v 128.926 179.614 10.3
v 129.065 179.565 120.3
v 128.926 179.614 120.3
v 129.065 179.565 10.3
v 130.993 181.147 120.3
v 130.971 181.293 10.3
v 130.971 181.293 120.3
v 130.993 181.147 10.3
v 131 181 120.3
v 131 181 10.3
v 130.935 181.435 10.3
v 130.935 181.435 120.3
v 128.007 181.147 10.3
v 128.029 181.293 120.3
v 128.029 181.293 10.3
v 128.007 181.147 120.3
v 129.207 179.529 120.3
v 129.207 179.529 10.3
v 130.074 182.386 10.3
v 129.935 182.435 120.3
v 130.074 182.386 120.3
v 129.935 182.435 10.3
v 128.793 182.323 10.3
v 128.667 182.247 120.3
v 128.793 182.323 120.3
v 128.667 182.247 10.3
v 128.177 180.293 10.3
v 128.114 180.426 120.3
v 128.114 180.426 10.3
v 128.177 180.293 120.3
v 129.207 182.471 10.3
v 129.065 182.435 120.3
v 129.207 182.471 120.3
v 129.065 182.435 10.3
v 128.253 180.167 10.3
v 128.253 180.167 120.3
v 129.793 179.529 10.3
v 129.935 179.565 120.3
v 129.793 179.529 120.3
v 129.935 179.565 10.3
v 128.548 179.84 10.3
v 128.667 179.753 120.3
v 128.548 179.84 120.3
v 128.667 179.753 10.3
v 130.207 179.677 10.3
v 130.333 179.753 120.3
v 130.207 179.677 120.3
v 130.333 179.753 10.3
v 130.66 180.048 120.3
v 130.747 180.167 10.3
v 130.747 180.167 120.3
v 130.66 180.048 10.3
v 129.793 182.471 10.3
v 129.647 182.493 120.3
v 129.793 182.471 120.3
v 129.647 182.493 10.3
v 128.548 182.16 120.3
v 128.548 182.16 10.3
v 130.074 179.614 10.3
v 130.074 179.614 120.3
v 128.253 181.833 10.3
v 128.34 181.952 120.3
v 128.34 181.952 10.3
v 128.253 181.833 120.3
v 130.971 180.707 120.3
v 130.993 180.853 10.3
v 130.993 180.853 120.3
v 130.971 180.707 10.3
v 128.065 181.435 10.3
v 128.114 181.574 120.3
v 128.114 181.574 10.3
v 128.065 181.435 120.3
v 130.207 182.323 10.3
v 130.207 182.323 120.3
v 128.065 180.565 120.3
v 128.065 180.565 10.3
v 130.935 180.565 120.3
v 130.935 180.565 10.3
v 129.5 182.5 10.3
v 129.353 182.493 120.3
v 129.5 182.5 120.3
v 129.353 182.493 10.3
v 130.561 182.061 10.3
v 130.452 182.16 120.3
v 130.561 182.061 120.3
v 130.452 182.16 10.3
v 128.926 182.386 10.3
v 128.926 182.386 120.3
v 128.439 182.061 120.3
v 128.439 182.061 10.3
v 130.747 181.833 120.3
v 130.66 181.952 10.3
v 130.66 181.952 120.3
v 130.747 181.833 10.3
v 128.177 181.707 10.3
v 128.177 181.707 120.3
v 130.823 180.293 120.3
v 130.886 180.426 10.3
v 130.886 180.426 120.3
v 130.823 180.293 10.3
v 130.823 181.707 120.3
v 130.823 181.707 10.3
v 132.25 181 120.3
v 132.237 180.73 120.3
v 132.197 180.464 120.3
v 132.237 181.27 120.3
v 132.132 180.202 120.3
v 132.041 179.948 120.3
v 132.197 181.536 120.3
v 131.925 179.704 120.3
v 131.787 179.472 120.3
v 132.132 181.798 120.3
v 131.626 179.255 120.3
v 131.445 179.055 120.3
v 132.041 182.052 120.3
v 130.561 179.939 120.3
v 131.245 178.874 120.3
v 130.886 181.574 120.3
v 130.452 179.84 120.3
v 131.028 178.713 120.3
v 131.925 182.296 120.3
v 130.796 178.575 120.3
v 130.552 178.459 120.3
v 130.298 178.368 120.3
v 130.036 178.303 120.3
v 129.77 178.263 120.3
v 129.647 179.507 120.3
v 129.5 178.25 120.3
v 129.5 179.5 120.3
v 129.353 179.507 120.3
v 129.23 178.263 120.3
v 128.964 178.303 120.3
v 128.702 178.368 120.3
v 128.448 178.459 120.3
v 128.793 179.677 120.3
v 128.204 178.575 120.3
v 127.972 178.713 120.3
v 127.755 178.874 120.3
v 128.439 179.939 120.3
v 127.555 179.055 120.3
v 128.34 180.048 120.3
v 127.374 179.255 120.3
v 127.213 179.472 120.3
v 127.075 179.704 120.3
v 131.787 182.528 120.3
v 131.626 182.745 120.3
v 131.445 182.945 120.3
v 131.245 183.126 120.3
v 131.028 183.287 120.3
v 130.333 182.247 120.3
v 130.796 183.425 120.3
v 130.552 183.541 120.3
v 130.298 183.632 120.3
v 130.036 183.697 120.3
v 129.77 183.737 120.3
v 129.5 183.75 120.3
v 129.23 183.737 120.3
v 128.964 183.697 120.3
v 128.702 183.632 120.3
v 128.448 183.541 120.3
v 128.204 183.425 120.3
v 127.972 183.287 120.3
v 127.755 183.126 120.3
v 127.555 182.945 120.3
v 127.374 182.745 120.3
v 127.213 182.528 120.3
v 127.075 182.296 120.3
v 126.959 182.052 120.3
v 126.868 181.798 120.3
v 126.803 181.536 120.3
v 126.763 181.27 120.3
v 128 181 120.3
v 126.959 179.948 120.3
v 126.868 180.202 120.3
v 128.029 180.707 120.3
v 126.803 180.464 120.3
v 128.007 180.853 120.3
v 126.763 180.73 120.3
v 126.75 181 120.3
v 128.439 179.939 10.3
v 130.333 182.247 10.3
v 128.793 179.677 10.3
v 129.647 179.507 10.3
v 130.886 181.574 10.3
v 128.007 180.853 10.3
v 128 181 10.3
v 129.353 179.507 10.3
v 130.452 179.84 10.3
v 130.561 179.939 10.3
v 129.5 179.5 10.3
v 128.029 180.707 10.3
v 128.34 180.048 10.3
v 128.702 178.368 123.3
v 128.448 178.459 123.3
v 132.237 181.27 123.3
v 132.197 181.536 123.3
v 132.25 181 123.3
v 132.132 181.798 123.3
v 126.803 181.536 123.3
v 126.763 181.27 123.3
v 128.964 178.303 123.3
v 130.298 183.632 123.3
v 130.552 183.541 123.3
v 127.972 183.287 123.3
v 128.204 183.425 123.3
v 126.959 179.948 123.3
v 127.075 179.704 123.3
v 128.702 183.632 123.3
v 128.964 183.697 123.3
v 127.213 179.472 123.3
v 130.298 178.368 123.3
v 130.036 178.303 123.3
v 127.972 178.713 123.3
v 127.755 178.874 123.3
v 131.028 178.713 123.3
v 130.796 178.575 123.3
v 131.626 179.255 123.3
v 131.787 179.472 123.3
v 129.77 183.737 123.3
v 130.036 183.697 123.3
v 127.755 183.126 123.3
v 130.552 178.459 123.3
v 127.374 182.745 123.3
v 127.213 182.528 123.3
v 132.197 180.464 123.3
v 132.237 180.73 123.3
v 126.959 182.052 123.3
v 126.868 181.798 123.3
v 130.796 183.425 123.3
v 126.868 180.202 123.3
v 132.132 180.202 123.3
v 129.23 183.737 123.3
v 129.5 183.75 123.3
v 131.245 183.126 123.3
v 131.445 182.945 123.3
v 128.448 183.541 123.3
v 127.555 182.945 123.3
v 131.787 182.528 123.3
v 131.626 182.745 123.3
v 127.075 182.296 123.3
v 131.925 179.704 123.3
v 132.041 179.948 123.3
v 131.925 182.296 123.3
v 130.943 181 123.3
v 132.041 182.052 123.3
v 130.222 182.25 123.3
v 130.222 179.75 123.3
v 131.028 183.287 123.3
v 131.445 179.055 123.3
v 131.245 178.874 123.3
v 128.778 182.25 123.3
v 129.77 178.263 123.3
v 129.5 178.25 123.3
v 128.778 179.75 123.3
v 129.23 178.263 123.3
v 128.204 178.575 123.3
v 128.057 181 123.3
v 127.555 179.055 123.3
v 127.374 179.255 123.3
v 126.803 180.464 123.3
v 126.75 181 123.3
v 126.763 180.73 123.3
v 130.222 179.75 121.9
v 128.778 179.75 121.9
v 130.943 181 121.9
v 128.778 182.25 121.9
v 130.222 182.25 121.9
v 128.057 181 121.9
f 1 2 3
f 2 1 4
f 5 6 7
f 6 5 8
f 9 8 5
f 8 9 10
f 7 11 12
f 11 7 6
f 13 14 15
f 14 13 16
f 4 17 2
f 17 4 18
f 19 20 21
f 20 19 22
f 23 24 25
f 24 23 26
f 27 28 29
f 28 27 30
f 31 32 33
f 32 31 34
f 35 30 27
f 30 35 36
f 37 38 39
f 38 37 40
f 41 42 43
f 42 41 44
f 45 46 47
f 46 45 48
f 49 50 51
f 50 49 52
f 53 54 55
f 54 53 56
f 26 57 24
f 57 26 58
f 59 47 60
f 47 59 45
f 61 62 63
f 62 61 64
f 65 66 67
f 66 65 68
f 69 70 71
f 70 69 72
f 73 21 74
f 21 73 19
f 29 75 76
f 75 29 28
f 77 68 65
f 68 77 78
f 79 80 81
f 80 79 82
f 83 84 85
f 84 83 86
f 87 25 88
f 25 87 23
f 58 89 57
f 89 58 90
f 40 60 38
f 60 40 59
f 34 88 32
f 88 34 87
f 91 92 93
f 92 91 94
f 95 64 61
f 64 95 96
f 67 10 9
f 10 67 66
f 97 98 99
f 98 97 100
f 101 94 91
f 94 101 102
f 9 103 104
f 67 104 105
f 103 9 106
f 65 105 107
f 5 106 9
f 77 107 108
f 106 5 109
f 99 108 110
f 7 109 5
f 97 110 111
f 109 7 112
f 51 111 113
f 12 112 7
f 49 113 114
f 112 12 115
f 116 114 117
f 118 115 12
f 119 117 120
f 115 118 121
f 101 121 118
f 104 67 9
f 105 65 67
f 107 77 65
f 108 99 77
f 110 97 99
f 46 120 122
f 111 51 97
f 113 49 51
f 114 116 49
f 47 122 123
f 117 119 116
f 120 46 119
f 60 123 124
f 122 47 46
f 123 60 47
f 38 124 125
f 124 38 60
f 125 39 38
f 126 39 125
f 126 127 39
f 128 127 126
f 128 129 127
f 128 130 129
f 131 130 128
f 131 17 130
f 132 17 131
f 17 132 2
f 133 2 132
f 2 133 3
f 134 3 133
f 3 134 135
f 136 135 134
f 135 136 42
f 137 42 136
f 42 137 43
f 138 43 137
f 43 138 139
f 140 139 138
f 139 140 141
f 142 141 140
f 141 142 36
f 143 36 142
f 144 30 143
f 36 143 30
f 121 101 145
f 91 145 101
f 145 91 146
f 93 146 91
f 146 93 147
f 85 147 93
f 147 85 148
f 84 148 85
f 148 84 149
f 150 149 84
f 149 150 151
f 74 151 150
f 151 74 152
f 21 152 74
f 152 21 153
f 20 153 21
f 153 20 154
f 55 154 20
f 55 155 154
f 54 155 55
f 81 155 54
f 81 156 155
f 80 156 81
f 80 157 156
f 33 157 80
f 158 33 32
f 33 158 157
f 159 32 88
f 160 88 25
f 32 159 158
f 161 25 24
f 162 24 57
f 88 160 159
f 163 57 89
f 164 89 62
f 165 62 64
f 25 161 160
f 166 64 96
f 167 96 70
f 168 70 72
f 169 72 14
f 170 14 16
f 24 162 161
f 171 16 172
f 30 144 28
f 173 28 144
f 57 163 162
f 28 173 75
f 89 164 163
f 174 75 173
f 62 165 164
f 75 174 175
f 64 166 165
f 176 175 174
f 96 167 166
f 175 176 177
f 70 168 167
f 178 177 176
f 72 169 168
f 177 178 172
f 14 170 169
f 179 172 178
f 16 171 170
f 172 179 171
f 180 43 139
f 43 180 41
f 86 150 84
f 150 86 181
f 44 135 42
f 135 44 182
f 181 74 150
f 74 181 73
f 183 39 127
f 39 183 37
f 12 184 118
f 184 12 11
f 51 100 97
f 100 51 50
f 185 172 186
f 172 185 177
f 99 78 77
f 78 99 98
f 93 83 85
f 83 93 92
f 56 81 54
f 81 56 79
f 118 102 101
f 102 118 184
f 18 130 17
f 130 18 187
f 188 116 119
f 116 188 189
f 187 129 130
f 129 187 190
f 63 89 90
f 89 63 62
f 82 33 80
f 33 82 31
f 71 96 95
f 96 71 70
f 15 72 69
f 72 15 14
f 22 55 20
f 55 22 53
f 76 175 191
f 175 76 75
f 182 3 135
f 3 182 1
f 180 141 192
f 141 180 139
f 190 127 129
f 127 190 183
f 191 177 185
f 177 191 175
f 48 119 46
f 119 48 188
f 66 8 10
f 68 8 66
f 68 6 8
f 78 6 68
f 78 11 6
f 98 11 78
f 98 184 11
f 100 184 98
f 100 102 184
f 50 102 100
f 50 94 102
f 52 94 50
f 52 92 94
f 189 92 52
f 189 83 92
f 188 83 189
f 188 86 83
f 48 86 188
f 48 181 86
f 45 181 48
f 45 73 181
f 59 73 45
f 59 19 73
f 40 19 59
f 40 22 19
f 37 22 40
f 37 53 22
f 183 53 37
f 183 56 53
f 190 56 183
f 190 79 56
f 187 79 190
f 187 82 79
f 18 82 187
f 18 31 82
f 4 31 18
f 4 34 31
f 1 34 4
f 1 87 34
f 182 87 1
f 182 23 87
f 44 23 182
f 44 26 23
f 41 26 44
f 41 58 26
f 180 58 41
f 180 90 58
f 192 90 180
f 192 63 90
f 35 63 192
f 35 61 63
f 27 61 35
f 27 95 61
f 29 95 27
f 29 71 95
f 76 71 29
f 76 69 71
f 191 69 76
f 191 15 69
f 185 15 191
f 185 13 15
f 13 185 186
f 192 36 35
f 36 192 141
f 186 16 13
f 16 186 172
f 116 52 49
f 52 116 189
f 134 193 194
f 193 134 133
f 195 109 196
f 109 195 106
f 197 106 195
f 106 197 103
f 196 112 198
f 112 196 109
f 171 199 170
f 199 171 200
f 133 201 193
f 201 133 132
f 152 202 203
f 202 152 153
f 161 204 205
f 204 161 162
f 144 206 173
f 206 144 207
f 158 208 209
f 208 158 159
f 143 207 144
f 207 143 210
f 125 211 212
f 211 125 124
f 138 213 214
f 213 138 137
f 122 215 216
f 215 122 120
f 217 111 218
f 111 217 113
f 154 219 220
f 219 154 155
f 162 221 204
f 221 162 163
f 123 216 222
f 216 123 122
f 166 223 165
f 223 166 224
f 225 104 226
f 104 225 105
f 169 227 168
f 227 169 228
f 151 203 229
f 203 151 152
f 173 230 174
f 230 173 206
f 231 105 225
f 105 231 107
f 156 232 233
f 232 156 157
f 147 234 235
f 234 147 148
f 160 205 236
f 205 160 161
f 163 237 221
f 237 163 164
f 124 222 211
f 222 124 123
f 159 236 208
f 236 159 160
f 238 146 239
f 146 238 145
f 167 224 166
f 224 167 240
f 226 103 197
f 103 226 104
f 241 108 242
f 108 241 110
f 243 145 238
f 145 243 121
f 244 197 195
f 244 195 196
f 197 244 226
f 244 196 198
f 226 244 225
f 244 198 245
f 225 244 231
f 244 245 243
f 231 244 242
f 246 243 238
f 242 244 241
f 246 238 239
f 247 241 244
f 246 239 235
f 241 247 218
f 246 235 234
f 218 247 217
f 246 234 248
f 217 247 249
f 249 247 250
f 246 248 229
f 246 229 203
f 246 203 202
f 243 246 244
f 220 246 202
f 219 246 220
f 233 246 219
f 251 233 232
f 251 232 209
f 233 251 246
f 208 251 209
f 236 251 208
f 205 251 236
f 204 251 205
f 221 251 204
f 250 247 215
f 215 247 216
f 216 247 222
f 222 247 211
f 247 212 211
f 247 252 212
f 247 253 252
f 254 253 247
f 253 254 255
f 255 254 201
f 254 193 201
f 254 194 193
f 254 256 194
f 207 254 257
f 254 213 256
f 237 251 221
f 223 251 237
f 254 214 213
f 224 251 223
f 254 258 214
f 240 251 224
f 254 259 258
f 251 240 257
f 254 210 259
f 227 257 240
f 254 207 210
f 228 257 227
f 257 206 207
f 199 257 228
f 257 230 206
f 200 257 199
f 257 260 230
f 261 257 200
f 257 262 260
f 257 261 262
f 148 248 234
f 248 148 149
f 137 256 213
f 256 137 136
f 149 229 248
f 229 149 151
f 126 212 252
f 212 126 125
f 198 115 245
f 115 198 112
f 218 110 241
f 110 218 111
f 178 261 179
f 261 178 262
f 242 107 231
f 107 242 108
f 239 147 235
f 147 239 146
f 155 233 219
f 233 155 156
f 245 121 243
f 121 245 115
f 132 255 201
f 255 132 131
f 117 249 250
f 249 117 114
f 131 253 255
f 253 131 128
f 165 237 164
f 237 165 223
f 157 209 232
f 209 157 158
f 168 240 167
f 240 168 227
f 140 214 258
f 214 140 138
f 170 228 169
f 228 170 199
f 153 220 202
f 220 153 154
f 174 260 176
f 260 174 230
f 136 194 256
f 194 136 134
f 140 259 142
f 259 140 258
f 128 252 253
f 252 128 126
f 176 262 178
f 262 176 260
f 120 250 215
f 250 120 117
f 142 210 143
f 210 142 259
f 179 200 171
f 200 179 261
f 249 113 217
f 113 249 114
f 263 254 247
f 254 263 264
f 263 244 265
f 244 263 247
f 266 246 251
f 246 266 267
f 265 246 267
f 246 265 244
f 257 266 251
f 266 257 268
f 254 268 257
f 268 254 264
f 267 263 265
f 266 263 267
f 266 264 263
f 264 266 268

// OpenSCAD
// Generated from the same CSG operations as STEP. Rebuild with spec/build_parent_hand_service.py.
difference(){union(){translate([129.5,181,10.3]) cylinder(r=1.5,h=110,$fn=64);translate([129.5,181,120.3]) cylinder(r=2.75,h=3,$fn=64);}translate([129.5,181,121.9]) cylinder(r=1.4433756729740643,h=1.5,$fn=6);}
